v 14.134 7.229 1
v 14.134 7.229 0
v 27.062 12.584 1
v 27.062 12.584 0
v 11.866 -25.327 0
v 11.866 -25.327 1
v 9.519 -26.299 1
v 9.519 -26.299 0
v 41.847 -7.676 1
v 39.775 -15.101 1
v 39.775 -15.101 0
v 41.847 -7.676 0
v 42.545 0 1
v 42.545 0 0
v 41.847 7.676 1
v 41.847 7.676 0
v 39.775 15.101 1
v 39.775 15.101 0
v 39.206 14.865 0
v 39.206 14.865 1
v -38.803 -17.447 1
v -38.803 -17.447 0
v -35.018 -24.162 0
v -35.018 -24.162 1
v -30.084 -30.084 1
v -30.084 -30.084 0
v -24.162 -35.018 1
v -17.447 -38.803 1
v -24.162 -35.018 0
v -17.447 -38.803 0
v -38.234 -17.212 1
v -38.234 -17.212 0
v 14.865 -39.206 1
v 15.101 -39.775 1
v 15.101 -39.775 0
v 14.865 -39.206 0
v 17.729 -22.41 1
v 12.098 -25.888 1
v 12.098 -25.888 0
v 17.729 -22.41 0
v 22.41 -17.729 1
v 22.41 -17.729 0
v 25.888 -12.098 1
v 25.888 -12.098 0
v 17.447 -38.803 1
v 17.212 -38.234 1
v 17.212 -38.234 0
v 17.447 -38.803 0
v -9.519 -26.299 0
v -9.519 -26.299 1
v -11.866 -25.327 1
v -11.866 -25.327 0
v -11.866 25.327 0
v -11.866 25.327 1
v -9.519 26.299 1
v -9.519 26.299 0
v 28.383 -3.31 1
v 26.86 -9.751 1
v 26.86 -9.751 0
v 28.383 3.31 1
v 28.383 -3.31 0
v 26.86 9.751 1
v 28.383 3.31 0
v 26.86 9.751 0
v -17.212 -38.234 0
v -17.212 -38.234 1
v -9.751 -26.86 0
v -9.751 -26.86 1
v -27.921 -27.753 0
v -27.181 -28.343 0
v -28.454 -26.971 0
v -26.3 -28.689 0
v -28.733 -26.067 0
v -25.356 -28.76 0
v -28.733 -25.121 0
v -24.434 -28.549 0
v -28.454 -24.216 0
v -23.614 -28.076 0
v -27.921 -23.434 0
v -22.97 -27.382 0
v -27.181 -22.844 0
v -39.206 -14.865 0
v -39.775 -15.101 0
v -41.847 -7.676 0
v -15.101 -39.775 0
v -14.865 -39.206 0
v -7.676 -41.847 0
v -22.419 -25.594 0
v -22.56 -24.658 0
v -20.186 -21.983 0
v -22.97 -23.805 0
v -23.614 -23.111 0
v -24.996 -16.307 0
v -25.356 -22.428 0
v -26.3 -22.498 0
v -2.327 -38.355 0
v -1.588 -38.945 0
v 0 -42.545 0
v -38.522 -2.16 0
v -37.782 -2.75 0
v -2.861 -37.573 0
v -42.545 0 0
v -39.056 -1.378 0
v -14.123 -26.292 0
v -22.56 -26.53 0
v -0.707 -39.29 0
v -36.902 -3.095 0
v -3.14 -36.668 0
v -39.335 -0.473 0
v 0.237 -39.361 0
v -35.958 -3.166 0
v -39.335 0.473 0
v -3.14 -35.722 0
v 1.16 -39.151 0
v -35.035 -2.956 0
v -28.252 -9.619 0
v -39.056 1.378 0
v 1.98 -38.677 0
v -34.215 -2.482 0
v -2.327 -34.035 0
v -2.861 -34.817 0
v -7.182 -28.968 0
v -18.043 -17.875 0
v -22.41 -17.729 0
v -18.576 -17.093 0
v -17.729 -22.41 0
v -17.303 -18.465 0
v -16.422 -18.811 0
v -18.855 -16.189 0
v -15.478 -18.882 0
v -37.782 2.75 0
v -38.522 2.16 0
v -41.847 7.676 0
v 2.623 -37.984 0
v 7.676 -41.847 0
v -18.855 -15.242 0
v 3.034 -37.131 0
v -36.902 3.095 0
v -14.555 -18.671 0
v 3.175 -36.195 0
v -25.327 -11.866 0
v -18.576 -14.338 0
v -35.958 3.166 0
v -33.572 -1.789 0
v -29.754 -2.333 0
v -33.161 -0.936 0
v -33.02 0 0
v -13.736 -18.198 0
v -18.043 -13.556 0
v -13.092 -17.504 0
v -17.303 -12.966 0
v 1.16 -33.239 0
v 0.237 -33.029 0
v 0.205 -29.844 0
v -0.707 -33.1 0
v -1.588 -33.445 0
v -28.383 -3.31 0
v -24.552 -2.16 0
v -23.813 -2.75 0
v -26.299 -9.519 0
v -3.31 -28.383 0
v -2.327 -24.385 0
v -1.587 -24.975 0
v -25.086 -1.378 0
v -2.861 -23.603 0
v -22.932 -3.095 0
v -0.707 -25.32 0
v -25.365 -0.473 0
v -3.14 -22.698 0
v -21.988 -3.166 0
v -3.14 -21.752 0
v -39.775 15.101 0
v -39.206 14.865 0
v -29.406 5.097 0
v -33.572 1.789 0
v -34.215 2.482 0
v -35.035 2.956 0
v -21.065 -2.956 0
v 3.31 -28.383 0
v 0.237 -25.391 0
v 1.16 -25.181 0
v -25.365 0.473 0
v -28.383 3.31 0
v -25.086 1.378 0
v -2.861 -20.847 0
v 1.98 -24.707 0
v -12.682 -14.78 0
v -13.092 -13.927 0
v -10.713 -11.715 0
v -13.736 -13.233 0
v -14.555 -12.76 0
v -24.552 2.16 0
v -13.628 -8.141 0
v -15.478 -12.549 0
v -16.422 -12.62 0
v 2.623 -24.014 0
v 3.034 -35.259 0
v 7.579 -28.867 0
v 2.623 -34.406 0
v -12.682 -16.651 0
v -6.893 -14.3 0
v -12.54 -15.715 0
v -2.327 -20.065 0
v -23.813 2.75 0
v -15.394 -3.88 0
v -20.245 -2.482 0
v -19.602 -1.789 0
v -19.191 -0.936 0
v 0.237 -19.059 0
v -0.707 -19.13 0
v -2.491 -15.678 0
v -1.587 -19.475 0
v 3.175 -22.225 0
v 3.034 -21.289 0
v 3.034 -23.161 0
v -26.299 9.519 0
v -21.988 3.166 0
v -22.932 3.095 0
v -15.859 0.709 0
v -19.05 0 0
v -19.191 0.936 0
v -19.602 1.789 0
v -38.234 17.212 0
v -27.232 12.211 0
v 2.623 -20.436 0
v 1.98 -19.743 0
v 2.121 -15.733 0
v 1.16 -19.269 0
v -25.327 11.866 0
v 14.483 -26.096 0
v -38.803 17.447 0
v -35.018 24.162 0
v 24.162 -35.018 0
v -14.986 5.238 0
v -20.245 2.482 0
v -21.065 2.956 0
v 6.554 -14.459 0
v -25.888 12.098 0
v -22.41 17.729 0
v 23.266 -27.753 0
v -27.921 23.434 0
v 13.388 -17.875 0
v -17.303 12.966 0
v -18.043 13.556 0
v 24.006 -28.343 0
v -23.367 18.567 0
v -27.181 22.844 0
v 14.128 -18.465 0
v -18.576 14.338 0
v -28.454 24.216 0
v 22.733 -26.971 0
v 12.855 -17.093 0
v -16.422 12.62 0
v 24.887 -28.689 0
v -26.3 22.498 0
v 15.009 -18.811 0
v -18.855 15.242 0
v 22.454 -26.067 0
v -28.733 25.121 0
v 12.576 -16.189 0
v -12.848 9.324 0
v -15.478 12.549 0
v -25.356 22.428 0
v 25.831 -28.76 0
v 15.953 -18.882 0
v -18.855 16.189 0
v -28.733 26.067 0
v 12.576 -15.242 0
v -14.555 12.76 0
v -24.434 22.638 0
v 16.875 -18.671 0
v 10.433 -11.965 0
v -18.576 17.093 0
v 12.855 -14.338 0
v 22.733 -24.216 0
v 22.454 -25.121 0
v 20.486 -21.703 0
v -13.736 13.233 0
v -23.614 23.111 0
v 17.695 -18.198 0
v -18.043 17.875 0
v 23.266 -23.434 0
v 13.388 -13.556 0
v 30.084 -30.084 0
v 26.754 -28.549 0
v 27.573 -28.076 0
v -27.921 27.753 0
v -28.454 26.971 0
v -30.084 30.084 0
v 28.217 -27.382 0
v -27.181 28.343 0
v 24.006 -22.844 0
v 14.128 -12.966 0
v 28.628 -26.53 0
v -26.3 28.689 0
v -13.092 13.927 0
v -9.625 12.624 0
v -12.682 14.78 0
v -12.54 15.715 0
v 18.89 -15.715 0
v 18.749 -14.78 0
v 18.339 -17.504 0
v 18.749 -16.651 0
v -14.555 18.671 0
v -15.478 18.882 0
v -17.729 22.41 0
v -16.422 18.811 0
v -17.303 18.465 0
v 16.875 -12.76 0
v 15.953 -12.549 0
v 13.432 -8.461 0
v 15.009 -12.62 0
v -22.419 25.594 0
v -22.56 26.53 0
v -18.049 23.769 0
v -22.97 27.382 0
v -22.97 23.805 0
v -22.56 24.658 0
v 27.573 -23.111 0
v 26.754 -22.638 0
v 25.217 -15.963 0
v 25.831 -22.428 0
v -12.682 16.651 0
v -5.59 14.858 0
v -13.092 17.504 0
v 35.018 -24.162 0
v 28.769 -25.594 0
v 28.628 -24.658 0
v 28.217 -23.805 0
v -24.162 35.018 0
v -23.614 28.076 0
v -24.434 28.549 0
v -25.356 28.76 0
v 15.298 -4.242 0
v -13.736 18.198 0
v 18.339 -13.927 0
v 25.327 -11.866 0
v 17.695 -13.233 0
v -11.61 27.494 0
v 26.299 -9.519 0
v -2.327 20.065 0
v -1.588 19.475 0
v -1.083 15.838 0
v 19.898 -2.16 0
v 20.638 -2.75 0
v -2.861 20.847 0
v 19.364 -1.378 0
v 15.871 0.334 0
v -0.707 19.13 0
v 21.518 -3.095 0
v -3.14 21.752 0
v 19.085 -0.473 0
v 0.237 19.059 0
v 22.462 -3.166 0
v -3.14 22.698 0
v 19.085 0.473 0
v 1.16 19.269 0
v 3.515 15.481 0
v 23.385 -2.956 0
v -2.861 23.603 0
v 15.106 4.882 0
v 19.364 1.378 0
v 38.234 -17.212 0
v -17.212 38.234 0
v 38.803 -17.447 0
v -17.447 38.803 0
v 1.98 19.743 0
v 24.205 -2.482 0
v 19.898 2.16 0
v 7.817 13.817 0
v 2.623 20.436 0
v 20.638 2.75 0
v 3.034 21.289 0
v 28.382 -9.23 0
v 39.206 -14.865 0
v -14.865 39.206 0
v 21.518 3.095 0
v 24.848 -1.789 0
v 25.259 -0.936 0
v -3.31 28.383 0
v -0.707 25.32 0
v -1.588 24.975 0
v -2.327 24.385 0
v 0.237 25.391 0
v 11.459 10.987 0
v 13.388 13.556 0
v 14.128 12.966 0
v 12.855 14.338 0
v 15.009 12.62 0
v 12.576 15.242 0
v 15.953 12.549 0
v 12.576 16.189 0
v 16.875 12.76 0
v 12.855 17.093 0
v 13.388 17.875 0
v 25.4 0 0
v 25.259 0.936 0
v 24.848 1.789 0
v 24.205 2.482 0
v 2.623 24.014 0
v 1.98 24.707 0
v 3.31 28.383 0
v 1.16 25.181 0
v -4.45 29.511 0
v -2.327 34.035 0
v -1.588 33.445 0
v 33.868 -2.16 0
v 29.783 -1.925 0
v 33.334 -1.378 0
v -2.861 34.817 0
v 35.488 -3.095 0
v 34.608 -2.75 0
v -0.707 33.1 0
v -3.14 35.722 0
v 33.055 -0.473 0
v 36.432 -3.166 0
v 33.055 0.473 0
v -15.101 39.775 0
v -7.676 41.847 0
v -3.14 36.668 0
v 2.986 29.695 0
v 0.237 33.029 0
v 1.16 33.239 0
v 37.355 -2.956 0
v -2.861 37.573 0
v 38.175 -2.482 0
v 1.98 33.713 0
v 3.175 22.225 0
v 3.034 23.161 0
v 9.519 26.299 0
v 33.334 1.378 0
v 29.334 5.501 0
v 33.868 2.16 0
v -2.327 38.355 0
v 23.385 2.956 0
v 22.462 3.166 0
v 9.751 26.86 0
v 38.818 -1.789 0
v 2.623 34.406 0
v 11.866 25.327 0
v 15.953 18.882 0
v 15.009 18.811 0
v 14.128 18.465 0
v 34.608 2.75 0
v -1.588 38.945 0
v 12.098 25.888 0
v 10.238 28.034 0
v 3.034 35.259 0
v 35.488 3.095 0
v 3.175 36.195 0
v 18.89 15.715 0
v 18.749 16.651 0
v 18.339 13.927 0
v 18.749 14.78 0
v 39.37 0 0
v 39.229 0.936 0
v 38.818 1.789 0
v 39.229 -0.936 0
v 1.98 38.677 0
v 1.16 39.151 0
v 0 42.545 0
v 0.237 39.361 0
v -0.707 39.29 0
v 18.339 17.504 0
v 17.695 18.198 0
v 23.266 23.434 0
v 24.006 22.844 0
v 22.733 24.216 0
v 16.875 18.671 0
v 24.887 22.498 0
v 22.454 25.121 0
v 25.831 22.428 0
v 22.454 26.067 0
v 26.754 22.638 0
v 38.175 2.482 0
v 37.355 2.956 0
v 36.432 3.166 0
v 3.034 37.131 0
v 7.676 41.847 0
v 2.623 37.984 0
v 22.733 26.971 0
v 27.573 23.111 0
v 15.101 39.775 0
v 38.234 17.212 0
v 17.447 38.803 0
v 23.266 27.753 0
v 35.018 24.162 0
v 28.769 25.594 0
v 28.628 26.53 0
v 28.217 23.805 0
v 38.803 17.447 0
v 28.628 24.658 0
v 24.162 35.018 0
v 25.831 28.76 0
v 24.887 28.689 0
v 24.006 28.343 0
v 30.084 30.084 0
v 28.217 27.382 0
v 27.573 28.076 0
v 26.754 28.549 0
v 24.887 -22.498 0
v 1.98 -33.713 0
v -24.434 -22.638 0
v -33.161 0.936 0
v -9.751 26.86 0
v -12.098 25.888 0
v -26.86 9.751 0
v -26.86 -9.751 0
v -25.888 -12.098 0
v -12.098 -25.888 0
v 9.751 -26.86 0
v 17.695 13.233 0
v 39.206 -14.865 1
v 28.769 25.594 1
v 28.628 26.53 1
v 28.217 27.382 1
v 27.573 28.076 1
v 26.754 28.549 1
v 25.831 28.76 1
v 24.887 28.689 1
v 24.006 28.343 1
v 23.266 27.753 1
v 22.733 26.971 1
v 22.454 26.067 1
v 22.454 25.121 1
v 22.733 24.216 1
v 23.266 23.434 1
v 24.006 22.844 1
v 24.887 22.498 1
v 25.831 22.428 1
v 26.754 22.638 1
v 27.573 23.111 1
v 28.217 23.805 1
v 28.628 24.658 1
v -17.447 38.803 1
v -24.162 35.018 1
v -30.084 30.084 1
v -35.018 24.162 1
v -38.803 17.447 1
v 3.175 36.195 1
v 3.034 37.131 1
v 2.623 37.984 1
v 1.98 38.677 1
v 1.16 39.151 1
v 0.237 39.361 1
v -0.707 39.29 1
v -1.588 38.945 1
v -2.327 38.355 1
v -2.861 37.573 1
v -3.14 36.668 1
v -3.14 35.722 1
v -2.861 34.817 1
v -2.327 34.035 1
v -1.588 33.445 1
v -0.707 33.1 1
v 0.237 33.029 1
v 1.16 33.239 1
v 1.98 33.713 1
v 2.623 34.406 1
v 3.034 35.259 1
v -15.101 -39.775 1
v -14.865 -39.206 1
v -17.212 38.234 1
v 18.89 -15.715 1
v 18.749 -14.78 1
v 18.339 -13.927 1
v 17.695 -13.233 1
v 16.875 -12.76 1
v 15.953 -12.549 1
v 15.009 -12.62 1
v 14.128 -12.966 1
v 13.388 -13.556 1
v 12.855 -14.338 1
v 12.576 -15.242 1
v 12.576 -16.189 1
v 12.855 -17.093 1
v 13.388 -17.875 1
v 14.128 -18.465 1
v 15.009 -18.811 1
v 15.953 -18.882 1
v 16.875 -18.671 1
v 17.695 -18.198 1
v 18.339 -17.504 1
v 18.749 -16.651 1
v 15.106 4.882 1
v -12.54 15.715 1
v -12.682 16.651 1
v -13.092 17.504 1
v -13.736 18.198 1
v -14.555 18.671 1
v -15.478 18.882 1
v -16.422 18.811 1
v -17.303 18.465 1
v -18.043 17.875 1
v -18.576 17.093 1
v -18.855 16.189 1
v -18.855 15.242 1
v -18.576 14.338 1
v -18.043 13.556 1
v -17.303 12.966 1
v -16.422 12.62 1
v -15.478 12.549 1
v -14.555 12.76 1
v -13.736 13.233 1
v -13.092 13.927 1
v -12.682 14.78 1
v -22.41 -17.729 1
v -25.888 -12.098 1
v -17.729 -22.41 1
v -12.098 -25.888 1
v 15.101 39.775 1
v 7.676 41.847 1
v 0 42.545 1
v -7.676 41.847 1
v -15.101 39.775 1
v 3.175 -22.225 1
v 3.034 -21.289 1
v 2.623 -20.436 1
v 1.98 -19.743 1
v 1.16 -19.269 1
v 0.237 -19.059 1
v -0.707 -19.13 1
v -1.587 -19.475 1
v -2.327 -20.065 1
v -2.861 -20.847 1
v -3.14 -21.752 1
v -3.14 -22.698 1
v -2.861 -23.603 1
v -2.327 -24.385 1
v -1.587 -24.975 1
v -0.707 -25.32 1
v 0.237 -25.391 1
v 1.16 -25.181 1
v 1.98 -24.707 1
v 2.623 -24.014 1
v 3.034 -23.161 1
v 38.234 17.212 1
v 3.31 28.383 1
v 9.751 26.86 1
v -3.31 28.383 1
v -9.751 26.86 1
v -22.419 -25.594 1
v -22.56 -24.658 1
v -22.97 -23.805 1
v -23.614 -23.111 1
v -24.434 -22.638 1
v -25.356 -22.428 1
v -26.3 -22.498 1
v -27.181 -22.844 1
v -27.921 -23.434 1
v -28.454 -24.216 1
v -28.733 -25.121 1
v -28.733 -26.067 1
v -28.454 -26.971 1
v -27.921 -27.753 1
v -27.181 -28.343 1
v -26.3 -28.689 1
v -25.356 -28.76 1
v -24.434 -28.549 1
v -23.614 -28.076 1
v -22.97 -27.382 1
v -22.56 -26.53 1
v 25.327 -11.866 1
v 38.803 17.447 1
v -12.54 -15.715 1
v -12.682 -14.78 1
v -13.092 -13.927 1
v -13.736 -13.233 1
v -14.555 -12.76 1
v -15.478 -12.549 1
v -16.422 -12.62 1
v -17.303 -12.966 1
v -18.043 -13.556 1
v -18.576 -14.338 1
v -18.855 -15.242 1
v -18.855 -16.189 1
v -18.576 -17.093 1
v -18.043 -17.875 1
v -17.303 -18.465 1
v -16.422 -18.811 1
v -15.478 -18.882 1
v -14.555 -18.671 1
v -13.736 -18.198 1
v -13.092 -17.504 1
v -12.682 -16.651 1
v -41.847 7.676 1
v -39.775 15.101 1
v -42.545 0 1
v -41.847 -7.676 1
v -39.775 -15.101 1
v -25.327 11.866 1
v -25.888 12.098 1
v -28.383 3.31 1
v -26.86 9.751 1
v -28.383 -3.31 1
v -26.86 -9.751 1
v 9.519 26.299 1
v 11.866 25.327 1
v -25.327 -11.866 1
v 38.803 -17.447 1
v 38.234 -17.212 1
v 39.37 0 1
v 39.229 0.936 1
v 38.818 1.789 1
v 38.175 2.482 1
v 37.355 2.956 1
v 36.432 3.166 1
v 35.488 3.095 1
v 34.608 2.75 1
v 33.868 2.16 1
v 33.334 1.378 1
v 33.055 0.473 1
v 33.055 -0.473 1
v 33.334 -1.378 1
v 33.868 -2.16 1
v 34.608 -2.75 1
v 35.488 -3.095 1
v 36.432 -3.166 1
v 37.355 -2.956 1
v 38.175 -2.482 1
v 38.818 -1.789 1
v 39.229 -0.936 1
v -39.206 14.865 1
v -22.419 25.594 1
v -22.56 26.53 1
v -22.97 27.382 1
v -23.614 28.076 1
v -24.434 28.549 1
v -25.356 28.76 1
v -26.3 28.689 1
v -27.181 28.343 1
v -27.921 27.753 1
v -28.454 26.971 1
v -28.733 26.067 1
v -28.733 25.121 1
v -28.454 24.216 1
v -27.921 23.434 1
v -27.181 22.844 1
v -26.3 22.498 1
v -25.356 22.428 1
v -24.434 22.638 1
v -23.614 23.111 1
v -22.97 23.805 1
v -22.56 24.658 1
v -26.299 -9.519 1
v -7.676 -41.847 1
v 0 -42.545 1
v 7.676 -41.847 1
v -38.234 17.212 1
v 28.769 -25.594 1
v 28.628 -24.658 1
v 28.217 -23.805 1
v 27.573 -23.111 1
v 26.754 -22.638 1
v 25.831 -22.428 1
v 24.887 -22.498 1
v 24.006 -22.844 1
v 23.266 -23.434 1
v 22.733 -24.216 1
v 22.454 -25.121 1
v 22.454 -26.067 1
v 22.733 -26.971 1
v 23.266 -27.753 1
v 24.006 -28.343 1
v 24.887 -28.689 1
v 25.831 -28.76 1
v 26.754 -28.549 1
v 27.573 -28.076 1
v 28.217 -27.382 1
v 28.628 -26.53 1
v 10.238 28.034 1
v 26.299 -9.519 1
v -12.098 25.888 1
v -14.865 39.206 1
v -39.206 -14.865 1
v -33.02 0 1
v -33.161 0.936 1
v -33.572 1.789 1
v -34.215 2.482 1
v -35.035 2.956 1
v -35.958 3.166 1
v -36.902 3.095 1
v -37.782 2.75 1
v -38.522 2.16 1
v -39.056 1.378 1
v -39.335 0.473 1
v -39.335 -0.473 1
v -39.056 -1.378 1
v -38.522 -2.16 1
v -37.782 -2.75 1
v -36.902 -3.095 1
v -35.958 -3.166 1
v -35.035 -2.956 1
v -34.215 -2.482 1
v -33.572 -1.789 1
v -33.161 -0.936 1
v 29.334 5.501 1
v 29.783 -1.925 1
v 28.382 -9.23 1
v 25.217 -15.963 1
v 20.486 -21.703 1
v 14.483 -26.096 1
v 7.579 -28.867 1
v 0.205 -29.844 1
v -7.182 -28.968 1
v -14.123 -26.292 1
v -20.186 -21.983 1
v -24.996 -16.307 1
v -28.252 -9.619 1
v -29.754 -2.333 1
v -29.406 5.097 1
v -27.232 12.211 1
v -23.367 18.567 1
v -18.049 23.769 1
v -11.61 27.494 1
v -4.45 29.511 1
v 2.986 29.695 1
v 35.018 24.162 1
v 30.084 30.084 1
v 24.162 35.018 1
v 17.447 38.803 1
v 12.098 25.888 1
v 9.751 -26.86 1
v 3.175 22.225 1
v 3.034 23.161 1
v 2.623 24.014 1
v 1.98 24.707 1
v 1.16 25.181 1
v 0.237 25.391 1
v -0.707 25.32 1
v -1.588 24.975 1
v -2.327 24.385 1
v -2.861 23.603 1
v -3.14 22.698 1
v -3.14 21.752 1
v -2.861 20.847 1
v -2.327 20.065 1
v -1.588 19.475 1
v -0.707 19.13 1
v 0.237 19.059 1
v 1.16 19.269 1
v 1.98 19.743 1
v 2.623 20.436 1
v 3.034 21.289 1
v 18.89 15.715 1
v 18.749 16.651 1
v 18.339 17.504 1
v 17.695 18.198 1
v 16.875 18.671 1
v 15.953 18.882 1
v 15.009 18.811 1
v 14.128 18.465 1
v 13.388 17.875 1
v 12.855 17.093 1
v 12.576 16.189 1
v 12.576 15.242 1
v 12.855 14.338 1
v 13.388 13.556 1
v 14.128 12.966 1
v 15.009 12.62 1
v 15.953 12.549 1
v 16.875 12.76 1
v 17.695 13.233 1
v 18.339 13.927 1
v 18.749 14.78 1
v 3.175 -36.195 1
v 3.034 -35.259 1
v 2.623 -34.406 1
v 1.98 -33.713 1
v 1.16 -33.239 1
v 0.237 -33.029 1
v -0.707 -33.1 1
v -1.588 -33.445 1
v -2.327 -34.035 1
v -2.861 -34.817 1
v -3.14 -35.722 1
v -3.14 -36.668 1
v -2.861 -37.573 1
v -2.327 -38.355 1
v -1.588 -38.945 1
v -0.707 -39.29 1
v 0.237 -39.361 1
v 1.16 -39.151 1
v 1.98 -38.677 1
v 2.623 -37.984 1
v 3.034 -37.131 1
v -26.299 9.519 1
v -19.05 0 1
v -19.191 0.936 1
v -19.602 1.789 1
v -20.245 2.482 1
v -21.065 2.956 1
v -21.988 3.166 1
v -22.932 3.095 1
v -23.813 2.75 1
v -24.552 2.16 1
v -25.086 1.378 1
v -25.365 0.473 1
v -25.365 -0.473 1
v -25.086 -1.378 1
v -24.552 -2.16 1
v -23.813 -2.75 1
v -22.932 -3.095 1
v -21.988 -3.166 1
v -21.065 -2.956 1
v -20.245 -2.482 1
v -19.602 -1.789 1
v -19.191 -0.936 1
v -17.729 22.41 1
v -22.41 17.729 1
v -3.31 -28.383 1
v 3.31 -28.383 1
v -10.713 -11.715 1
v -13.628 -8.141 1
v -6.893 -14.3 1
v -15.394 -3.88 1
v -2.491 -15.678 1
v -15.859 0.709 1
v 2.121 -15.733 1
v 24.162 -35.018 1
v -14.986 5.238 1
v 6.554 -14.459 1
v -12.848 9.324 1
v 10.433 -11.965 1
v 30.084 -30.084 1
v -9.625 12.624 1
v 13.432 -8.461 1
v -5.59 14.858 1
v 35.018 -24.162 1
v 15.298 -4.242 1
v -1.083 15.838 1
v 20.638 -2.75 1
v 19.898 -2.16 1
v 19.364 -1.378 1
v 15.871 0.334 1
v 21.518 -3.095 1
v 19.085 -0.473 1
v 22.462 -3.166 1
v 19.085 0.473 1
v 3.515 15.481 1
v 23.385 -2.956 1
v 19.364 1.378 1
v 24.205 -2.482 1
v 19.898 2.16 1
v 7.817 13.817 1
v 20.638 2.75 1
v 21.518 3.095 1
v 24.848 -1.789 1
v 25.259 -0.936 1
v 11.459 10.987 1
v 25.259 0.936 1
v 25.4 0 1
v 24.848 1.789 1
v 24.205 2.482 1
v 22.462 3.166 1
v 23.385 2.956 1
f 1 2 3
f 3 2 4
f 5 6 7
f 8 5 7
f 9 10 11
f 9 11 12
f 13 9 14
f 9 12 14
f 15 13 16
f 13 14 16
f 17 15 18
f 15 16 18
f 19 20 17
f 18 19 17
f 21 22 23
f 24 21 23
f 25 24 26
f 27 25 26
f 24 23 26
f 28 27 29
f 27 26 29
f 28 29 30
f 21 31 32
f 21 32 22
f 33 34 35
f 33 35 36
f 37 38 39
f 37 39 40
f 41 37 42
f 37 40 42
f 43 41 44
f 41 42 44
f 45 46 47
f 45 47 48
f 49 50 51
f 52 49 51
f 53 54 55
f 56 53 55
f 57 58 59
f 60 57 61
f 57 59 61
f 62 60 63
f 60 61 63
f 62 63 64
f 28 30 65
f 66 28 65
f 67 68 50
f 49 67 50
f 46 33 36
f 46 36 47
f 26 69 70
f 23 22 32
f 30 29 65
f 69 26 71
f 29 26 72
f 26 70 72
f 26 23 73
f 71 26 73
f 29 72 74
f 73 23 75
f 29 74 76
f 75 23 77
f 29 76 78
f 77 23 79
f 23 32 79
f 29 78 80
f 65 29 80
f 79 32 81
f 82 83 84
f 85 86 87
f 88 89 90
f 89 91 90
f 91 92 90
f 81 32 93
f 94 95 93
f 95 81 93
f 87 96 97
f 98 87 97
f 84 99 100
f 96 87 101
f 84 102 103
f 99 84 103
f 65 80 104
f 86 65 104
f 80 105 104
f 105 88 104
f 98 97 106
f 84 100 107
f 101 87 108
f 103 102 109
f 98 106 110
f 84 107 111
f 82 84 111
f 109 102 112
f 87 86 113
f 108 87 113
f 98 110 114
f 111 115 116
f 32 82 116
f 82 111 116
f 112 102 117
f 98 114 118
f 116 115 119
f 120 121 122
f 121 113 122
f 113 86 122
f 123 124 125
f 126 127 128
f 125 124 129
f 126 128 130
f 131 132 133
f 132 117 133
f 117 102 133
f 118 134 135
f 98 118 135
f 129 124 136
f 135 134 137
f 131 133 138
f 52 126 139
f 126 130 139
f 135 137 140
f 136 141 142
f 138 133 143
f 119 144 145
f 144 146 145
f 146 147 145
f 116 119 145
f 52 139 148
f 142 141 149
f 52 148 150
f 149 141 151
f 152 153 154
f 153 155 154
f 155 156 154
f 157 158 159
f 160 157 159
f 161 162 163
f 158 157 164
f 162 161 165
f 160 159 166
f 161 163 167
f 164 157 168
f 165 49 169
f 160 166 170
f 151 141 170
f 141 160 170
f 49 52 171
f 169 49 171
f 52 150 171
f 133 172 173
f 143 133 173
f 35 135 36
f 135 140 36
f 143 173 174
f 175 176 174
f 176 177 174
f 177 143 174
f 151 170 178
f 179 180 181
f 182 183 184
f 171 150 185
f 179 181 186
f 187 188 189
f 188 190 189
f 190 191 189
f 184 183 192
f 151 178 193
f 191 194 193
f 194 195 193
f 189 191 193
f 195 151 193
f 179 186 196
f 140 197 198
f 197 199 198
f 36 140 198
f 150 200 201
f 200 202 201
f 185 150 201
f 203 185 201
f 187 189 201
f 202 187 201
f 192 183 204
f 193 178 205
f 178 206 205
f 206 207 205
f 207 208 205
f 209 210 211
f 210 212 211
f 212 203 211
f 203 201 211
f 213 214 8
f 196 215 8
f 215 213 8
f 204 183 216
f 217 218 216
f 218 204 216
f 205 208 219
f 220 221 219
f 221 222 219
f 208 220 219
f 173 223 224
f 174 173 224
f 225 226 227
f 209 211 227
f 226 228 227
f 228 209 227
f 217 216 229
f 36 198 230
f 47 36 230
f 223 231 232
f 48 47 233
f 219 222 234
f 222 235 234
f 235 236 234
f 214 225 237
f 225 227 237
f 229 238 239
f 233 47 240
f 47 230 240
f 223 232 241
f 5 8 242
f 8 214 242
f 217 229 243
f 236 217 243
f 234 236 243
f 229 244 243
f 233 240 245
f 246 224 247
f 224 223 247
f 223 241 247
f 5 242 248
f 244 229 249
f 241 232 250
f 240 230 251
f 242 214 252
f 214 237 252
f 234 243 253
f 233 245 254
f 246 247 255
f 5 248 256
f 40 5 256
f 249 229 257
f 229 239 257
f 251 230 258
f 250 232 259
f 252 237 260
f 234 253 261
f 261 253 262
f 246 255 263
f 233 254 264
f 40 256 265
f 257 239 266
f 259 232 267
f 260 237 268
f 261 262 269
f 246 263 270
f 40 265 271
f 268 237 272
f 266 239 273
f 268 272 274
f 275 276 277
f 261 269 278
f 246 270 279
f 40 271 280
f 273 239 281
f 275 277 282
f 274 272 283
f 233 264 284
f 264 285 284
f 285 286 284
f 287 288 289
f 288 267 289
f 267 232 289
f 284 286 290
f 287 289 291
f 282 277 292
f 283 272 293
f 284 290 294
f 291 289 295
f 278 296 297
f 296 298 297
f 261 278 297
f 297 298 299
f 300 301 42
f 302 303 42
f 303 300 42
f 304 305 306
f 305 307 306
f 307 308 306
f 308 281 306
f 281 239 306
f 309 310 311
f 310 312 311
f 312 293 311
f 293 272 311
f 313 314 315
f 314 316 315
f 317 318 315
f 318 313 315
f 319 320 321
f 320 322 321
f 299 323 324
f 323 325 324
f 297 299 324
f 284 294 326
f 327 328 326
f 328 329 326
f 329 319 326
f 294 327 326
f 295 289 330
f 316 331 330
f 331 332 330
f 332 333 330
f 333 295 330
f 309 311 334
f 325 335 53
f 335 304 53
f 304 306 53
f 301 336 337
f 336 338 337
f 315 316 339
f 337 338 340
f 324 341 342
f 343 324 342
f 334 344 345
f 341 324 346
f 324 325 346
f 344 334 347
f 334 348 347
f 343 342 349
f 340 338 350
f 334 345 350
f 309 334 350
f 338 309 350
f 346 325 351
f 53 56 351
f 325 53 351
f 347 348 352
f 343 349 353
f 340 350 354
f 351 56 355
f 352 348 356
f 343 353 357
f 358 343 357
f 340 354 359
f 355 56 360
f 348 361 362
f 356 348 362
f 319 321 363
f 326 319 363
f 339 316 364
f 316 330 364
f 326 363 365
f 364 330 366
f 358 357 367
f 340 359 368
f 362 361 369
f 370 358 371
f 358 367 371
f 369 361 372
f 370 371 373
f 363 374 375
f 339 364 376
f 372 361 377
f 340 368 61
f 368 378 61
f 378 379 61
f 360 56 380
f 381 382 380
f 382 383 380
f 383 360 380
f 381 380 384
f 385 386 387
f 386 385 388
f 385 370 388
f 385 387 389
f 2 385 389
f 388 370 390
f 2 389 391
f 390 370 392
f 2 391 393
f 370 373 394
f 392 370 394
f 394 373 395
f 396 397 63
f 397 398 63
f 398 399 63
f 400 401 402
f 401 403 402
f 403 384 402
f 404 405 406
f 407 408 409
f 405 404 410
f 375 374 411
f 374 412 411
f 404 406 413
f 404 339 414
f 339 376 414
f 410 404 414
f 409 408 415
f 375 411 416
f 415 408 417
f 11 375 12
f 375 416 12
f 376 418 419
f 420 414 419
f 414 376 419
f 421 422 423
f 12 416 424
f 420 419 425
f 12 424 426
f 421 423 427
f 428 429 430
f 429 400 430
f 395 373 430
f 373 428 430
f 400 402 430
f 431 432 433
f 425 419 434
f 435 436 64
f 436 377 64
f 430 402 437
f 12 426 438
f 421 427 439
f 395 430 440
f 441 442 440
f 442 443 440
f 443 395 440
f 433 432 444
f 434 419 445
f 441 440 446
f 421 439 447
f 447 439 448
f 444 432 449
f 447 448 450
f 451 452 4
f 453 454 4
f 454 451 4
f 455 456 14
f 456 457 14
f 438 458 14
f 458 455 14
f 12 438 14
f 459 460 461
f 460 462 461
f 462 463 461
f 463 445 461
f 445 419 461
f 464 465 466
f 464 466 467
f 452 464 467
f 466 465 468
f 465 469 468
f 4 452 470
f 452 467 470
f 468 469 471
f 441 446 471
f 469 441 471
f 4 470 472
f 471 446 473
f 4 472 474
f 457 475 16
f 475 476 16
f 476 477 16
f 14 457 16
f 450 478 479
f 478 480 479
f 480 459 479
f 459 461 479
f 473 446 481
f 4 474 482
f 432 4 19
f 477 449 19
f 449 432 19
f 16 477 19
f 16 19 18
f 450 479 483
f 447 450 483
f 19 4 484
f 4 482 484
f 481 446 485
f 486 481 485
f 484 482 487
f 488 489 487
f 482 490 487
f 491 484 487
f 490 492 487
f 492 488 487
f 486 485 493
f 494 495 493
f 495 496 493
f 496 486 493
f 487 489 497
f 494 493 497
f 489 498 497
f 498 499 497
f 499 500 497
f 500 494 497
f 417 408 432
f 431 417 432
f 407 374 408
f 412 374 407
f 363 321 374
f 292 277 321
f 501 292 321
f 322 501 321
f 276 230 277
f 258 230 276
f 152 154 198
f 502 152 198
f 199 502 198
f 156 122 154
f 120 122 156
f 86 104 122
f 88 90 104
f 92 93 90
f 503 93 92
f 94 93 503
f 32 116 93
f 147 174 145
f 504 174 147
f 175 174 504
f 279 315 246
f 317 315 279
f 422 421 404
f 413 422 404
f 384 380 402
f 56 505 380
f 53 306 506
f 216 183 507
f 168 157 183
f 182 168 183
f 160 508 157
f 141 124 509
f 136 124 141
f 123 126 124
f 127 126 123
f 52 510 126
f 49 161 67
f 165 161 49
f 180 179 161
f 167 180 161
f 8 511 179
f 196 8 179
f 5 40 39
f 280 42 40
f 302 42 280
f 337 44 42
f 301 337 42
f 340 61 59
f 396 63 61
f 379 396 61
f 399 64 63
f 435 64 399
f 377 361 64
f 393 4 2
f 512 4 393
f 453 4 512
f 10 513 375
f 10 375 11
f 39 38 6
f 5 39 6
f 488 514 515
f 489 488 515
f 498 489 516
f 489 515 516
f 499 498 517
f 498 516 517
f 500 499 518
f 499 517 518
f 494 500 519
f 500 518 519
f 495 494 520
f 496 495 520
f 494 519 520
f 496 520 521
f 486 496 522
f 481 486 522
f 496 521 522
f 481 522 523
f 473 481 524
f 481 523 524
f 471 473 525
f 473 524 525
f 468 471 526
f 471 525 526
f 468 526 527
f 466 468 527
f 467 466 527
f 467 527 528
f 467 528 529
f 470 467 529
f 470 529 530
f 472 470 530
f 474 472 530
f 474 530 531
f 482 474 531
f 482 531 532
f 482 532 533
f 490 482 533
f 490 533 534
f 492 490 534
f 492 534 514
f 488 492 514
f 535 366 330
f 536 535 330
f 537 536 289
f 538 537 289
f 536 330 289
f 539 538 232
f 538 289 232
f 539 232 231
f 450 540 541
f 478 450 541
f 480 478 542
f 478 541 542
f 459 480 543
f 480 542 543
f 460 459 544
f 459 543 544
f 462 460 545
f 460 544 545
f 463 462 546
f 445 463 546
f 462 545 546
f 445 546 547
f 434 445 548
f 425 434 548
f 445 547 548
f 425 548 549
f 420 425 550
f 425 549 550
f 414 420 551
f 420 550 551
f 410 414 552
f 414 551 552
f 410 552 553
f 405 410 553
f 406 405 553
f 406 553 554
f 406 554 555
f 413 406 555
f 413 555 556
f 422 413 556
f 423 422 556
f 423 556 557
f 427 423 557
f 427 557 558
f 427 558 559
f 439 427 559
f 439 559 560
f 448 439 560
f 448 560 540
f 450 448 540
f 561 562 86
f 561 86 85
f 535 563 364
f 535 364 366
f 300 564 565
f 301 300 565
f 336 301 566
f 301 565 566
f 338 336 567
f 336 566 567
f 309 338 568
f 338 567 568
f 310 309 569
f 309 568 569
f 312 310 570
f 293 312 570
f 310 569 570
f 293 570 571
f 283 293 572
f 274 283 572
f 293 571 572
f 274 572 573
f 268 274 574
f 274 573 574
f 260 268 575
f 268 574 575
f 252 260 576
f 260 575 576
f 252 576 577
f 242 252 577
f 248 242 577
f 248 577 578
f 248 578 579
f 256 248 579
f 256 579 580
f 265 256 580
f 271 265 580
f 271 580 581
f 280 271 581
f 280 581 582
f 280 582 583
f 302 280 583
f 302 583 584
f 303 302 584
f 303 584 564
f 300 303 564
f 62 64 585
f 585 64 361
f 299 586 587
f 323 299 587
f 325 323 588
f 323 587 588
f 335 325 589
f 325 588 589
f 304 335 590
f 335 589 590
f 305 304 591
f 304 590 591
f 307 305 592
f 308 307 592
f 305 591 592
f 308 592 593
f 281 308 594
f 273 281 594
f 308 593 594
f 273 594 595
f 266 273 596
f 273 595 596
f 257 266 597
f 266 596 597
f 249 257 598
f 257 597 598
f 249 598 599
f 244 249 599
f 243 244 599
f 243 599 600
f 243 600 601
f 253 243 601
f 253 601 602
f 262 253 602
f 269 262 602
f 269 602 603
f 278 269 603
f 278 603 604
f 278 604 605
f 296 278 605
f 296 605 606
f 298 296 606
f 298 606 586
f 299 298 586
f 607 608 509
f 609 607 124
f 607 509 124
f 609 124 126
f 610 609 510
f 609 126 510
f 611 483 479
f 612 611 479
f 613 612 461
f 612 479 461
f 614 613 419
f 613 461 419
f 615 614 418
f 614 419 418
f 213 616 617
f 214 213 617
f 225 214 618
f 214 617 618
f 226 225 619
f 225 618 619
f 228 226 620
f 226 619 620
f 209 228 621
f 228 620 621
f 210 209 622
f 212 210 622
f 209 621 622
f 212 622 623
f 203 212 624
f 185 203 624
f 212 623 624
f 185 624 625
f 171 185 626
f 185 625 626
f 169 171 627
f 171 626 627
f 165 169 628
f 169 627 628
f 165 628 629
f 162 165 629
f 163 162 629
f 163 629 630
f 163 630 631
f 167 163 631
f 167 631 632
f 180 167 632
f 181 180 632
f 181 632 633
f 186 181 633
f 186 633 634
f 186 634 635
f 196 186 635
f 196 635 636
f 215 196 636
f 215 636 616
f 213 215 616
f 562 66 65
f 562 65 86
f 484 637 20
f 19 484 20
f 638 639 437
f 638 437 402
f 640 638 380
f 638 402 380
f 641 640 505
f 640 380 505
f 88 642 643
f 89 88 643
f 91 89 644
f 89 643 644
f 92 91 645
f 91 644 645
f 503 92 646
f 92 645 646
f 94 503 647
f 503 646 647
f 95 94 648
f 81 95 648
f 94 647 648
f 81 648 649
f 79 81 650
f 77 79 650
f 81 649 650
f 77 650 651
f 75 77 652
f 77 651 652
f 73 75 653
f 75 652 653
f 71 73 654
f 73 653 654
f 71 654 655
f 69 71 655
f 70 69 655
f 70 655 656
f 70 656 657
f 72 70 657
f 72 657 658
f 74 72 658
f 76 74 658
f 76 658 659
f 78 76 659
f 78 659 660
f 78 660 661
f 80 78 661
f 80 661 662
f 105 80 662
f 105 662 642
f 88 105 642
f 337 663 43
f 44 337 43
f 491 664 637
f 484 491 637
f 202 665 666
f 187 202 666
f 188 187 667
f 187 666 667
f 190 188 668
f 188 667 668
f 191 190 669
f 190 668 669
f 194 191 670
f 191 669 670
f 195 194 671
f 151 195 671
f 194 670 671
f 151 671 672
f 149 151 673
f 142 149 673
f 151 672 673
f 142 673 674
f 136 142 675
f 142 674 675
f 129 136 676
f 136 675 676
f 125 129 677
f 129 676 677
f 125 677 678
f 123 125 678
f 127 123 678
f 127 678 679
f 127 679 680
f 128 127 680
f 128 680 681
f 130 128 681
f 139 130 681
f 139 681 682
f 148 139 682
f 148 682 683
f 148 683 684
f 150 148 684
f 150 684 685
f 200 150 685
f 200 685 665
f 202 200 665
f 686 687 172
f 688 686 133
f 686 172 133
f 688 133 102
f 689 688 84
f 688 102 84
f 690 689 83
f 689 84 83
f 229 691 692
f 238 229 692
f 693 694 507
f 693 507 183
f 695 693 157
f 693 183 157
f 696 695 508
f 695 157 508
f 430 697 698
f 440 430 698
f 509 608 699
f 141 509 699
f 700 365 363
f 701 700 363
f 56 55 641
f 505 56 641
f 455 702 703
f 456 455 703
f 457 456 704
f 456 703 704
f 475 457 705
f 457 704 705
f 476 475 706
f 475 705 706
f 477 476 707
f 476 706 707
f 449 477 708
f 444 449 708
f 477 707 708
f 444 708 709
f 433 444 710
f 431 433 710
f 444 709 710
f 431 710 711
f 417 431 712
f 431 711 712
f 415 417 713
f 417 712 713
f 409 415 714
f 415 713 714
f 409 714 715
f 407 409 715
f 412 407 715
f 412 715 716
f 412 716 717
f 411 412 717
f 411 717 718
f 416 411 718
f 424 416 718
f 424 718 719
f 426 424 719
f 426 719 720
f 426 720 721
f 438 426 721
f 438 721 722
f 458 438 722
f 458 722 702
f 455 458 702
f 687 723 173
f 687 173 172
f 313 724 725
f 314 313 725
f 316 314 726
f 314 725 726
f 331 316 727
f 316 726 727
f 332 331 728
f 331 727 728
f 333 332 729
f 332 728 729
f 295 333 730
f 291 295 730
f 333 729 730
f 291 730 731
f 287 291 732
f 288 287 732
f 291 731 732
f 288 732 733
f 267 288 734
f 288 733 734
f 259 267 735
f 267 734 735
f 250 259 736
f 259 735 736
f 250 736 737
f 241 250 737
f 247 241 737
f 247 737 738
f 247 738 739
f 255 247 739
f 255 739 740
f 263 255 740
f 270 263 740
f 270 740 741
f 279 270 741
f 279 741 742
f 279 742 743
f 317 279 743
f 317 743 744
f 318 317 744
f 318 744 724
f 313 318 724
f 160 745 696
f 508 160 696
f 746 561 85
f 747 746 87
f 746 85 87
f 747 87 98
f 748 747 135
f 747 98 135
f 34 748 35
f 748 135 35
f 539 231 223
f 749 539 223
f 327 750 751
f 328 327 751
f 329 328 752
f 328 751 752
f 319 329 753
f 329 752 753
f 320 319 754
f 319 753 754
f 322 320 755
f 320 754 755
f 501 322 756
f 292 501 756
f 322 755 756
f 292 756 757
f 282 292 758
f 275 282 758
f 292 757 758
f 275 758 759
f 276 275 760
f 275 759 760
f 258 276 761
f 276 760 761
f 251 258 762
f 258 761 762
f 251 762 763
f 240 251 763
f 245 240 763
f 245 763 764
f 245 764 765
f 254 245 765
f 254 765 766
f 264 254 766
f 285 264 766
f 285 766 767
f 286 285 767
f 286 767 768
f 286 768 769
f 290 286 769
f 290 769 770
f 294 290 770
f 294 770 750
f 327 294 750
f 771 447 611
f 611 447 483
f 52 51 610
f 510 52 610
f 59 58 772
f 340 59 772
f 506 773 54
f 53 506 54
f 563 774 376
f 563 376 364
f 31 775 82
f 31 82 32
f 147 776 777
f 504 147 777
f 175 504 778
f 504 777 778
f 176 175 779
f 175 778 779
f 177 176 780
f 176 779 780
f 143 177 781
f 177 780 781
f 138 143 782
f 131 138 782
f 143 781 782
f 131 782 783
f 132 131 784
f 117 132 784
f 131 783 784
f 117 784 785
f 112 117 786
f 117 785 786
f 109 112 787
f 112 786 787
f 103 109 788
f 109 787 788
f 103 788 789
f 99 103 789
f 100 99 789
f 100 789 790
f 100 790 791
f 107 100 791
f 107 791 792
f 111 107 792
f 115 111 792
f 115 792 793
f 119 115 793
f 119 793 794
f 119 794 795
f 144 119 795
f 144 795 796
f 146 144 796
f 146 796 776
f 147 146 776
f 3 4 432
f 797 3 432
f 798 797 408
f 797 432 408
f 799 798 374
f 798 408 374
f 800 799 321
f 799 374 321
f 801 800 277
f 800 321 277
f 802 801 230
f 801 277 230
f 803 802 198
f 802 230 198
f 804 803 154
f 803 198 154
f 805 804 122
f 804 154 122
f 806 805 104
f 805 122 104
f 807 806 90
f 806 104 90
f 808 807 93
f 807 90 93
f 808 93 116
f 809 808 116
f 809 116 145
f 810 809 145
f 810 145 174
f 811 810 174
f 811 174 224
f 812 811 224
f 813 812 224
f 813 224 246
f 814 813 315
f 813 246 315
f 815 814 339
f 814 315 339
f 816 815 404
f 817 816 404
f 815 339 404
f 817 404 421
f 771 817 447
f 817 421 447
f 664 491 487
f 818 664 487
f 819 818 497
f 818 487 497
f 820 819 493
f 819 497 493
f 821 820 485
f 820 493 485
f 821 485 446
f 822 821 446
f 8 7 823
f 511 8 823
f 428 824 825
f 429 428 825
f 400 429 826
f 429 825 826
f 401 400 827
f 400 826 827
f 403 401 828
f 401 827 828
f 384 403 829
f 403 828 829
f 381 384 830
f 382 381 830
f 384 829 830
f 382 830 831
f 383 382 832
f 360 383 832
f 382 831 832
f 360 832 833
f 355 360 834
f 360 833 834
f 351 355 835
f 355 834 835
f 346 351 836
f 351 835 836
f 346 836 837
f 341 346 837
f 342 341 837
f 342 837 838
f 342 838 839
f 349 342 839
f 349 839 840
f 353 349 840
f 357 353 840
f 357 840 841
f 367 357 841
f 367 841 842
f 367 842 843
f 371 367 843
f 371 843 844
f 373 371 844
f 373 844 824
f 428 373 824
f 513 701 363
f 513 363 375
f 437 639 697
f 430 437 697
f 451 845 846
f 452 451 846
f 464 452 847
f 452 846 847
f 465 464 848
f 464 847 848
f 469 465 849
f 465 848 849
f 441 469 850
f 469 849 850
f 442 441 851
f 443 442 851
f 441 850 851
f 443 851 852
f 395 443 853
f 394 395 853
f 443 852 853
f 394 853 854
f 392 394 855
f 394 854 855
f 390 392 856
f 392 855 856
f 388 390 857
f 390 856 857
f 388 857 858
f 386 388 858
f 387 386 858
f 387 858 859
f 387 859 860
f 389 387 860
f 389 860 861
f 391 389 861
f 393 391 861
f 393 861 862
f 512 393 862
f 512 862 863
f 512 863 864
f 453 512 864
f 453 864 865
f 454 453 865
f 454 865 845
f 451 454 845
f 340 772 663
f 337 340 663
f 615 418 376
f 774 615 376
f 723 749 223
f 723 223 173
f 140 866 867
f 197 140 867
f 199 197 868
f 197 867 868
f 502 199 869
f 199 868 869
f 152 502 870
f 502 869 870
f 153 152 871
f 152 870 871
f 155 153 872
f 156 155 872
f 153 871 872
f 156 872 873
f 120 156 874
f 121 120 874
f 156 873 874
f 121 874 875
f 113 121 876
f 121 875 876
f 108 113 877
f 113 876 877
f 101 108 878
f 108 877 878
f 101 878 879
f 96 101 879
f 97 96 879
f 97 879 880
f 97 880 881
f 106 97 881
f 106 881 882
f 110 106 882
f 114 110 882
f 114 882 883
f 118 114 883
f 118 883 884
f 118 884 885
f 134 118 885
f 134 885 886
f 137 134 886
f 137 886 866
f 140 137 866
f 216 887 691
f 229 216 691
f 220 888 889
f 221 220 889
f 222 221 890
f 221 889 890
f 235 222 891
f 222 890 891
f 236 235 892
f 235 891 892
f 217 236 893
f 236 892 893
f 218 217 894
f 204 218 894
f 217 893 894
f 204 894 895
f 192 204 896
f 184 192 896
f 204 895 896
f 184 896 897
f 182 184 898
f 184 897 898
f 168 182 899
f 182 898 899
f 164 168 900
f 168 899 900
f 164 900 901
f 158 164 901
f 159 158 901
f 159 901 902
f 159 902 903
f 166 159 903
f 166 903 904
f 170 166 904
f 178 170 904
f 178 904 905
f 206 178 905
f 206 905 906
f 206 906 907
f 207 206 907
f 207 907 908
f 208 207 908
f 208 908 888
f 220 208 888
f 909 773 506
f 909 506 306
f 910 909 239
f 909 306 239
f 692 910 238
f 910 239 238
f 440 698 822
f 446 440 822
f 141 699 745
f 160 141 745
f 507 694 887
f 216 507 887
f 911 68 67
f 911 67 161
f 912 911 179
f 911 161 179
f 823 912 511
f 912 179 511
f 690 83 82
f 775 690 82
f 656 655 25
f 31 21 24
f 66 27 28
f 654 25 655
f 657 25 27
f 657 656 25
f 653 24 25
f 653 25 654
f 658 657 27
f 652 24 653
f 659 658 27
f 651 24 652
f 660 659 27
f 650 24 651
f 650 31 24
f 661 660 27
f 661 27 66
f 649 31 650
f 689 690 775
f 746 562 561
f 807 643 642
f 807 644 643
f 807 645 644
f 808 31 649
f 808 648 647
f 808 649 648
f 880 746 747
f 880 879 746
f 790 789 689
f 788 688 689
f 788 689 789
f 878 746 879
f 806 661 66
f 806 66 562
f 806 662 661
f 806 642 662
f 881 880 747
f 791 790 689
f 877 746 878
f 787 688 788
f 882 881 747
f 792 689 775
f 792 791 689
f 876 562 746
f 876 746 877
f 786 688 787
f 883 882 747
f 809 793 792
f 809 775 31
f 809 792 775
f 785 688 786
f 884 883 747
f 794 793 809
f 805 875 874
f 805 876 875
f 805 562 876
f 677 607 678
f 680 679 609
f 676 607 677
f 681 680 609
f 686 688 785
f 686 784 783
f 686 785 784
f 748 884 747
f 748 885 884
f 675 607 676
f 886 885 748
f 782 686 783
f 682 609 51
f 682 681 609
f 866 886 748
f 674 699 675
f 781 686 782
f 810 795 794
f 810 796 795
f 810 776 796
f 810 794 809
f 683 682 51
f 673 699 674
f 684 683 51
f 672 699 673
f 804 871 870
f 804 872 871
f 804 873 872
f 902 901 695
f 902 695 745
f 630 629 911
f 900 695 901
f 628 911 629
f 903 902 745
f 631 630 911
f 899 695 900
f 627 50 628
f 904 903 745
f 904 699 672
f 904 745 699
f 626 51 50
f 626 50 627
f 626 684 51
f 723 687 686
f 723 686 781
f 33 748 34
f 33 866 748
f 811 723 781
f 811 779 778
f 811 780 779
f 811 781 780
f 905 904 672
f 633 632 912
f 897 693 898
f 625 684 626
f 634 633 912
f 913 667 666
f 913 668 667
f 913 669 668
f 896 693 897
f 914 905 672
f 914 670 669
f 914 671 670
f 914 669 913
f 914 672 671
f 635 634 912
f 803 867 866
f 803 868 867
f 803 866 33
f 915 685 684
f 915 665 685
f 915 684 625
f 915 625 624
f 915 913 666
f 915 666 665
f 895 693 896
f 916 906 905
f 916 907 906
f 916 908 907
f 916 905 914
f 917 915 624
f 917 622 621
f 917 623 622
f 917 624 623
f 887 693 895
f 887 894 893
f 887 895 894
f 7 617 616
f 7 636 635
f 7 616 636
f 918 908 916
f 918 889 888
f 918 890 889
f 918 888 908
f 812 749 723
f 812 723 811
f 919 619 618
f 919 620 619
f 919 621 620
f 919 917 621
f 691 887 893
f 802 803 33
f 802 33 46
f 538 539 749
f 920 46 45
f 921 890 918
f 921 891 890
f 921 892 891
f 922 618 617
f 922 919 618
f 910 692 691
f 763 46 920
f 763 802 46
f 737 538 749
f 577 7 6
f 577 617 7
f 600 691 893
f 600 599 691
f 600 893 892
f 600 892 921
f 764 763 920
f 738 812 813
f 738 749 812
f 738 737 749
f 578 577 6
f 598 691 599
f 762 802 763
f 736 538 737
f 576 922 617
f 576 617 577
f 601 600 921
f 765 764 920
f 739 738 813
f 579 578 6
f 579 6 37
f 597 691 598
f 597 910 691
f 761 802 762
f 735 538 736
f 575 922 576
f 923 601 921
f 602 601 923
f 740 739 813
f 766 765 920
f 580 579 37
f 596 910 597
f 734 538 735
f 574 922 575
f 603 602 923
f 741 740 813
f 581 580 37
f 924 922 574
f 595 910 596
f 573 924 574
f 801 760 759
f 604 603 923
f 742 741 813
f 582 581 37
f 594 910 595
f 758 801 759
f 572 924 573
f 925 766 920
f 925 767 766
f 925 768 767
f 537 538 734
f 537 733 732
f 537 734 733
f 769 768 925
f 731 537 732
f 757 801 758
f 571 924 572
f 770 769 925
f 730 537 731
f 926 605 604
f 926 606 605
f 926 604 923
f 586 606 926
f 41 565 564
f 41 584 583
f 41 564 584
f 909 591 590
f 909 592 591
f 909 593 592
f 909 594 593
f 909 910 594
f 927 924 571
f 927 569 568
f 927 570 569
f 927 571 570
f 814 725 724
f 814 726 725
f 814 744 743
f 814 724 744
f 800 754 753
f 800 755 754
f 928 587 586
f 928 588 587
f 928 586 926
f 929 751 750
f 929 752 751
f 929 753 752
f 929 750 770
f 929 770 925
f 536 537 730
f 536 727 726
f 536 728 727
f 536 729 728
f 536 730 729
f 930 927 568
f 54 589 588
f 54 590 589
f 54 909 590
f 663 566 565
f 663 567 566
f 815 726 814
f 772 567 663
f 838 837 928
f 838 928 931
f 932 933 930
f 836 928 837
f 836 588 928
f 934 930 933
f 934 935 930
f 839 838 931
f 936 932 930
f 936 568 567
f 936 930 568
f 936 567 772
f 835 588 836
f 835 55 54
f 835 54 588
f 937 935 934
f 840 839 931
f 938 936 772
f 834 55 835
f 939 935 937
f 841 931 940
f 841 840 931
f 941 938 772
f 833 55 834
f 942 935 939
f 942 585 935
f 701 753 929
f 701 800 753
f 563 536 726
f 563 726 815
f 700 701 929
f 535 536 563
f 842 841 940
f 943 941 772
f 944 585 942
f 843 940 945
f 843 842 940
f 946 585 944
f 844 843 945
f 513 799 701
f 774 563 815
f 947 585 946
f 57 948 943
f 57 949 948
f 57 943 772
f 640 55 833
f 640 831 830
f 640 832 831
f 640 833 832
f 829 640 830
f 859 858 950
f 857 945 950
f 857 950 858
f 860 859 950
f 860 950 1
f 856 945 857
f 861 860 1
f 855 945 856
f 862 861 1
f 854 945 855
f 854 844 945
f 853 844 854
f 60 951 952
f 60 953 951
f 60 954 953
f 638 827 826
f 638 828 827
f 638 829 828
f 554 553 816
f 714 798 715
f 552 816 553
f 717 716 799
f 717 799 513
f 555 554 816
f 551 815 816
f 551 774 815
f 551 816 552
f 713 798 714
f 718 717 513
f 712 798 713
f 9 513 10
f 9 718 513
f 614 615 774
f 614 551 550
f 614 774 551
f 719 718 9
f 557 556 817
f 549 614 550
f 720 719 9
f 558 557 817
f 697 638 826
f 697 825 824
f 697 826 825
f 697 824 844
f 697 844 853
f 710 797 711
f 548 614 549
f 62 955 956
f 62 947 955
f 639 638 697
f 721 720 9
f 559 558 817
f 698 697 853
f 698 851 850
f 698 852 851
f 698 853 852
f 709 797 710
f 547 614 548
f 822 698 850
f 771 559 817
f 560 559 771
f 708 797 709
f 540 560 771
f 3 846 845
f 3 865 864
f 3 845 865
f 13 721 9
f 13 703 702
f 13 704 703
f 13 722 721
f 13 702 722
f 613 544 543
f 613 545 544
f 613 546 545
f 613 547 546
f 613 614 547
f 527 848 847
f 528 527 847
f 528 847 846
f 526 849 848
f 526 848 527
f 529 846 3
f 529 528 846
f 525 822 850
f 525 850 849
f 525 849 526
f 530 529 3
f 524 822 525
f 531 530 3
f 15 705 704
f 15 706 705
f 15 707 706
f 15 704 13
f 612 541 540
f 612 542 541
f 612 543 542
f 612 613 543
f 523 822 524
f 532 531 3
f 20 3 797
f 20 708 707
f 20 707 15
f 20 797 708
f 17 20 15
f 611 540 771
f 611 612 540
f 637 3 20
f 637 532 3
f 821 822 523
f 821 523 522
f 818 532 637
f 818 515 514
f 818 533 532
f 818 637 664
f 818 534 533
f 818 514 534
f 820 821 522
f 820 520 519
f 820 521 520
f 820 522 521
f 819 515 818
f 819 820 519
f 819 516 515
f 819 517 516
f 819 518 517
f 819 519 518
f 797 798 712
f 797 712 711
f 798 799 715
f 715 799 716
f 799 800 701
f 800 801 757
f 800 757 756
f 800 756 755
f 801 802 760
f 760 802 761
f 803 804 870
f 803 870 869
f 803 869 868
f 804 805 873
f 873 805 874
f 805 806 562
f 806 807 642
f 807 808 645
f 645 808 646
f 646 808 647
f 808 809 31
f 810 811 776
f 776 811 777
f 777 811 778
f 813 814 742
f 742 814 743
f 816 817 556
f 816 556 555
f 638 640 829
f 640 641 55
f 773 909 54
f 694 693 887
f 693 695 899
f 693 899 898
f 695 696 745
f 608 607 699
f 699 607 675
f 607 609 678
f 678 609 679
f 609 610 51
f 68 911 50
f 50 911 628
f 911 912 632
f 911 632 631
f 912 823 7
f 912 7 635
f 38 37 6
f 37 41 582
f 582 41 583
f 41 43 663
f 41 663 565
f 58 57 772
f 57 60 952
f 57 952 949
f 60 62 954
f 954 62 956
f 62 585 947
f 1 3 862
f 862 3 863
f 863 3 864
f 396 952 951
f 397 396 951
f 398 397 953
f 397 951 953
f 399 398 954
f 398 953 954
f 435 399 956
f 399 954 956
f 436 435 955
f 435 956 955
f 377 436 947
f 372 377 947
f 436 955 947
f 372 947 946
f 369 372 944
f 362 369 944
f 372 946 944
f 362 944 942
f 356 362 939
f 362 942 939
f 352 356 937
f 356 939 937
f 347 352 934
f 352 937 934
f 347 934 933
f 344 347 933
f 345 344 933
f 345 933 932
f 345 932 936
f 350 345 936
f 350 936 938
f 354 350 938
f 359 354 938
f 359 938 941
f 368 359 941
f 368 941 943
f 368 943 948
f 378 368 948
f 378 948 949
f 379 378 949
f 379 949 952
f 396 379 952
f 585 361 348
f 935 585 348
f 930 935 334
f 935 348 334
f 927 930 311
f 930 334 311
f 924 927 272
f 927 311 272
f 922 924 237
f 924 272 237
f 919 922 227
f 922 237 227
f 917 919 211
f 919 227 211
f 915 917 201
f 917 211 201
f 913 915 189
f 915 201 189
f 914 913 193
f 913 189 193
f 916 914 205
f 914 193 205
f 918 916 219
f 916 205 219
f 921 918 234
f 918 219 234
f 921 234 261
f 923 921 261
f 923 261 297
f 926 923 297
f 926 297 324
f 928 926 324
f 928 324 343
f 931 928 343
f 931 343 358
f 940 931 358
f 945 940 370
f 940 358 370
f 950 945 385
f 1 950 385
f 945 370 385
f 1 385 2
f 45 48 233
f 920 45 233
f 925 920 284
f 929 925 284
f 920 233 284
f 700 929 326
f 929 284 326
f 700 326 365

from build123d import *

# Parameters (mm, degrees)
BOSS_EXTRUDE1_DEPTH = 1
SKETCH2_R           = 3.175
CUT_EXTRUDE1_DEPTH  = 2
CUT_EXTRUDE2_DEPTH  = 2


with BuildPart() as part:
    # Sketch1 → Boss-Extrude1 (new body)
    with BuildSketch(Plane.XY):
        with BuildLine():
            Line((10.237514752, 28.034216891), (15.100684157, 39.774946424))
            ThreePointArc((15.100684157, 39.774946424), (-16.28126663, -39.306454711), (17.447338169, 38.802930505))
            Line((17.447338169, 38.802930505), (12.097700571, 25.88776286))
            ThreePointArc((12.097700571, 25.88776286), (-21.083635895, -19.287584671), (26.859778778, 9.751046558))
            Line((26.859778778, 9.751046558), (15.105587123, 4.88230096))
            ThreePointArc((15.105587123, 4.88230096), (-14.666587579, -6.075099489), (14.133571205, 7.228954972))
            Line((14.133571205, 7.228954972), (27.062200973, 12.584168765))
            ThreePointArc((27.062200973, 12.584168765), (-20.186460687, -21.982511911), (10.237514752, 28.034216891))
        make_face()
    extrude(amount=BOSS_EXTRUDE1_DEPTH)

    # Sketch2 → Cut-Extrude1 (cut, through all)
    with BuildSketch(Plane.XY.offset(1)):
        with Locations((22.225, 1.106e-06)):
            Circle(SKETCH2_R)
        with Locations((36.195, 0)):
            Circle(SKETCH2_R)
        with Locations((15.715448994, -15.71544743)):
            Circle(SKETCH2_R)
        with Locations((25.593729945, -25.593729945)):
            Circle(SKETCH2_R)
        with Locations((1.106e-06, -22.225)):
            Circle(SKETCH2_R)
        with Locations((0, -36.195)):
            Circle(SKETCH2_R)
        with Locations((-15.71544743, -15.715448994)):
            Circle(SKETCH2_R)
        with Locations((-25.593729945, -25.593729945)):
            Circle(SKETCH2_R)
        with Locations((-22.225, -1.106e-06)):
            Circle(SKETCH2_R)
        with Locations((-36.195, 0)):
            Circle(SKETCH2_R)
        with Locations((-15.715448994, 15.71544743)):
            Circle(SKETCH2_R)
        with Locations((-25.593729945, 25.593729945)):
            Circle(SKETCH2_R)
        with Locations((-1.106e-06, 22.225)):
            Circle(SKETCH2_R)
        with Locations((0, 36.195)):
            Circle(SKETCH2_R)
        with Locations((15.71544743, 15.715448994)):
            Circle(SKETCH2_R)
        with Locations((25.593729945, 25.593729945)):
            Circle(SKETCH2_R)
    extrude(amount=-CUT_EXTRUDE1_DEPTH, mode=Mode.SUBTRACT)

    # Sketch3 → Cut-Extrude2 (cut, through all)
    with BuildSketch(Plane.XY.offset(1)):
        Polygon((25.327186179, -11.865502107), (26.500513186, -12.351510066), (27.472529104, -10.004856053), (26.299202097, -9.518848094), align=None)
        Polygon((10.004856053, -27.472529104), (12.351510066, -26.500513186), (11.865502107, -25.327186179), (9.518848094, -26.299202097), align=None)
        Polygon((-12.351510066, -26.500513186), (-10.004856053, -27.472529104), (-9.518848094, -26.299202097), (-11.865502107, -25.327186179), align=None)
        Polygon((-27.472529104, -10.004856053), (-26.500513186, -12.351510066), (-25.327186179, -11.865502107), (-26.299202097, -9.518848094), align=None)
        Polygon((-26.500513186, 12.351510066), (-27.472529104, 10.004856053), (-26.299202097, 9.518848094), (-25.327186179, 11.865502107), align=None)
        Polygon((-10.004856053, 27.472529104), (-12.351510066, 26.500513186), (-11.865502107, 25.327186179), (-9.518848094, 26.299202097), align=None)
        Polygon((12.351510066, 26.500513186), (10.004856053, 27.472529104), (9.518848094, 26.299202097), (11.865502107, 25.327186179), align=None)
        Polygon((39.205799167, 14.864935644), (40.379126173, 15.350943603), (39.407110255, 17.697597616), (38.233783248, 17.211589657), align=None)
        Polygon((39.205799167, -14.864935644), (40.379126173, -15.350943603), (39.407110255, -17.697597616), (38.233783248, -17.211589657), align=None)
        Polygon((17.211589657, -38.233783248), (17.697597616, -39.407110255), (15.350943603, -40.379126173), (14.864935644, -39.205799167), align=None)
        Polygon((-14.864935644, -39.205799167), (-15.350943603, -40.379126173), (-17.697597616, -39.407110255), (-17.211589657, -38.233783248), align=None)
        Polygon((-38.233783248, -17.211589657), (-39.407110255, -17.697597616), (-40.379126173, -15.350943603), (-39.205799167, -14.864935644), align=None)
        Polygon((-39.205799167, 14.864935644), (-40.379126173, 15.350943603), (-39.407110255, 17.697597616), (-38.233783248, 17.211589657), align=None)
        Polygon((-17.211589657, 38.233783248), (-17.697597616, 39.407110255), (-15.350943603, 40.379126173), (-14.864935644, 39.205799167), align=None)
    extrude(amount=-CUT_EXTRUDE2_DEPTH, mode=Mode.SUBTRACT)


solid = part.part
